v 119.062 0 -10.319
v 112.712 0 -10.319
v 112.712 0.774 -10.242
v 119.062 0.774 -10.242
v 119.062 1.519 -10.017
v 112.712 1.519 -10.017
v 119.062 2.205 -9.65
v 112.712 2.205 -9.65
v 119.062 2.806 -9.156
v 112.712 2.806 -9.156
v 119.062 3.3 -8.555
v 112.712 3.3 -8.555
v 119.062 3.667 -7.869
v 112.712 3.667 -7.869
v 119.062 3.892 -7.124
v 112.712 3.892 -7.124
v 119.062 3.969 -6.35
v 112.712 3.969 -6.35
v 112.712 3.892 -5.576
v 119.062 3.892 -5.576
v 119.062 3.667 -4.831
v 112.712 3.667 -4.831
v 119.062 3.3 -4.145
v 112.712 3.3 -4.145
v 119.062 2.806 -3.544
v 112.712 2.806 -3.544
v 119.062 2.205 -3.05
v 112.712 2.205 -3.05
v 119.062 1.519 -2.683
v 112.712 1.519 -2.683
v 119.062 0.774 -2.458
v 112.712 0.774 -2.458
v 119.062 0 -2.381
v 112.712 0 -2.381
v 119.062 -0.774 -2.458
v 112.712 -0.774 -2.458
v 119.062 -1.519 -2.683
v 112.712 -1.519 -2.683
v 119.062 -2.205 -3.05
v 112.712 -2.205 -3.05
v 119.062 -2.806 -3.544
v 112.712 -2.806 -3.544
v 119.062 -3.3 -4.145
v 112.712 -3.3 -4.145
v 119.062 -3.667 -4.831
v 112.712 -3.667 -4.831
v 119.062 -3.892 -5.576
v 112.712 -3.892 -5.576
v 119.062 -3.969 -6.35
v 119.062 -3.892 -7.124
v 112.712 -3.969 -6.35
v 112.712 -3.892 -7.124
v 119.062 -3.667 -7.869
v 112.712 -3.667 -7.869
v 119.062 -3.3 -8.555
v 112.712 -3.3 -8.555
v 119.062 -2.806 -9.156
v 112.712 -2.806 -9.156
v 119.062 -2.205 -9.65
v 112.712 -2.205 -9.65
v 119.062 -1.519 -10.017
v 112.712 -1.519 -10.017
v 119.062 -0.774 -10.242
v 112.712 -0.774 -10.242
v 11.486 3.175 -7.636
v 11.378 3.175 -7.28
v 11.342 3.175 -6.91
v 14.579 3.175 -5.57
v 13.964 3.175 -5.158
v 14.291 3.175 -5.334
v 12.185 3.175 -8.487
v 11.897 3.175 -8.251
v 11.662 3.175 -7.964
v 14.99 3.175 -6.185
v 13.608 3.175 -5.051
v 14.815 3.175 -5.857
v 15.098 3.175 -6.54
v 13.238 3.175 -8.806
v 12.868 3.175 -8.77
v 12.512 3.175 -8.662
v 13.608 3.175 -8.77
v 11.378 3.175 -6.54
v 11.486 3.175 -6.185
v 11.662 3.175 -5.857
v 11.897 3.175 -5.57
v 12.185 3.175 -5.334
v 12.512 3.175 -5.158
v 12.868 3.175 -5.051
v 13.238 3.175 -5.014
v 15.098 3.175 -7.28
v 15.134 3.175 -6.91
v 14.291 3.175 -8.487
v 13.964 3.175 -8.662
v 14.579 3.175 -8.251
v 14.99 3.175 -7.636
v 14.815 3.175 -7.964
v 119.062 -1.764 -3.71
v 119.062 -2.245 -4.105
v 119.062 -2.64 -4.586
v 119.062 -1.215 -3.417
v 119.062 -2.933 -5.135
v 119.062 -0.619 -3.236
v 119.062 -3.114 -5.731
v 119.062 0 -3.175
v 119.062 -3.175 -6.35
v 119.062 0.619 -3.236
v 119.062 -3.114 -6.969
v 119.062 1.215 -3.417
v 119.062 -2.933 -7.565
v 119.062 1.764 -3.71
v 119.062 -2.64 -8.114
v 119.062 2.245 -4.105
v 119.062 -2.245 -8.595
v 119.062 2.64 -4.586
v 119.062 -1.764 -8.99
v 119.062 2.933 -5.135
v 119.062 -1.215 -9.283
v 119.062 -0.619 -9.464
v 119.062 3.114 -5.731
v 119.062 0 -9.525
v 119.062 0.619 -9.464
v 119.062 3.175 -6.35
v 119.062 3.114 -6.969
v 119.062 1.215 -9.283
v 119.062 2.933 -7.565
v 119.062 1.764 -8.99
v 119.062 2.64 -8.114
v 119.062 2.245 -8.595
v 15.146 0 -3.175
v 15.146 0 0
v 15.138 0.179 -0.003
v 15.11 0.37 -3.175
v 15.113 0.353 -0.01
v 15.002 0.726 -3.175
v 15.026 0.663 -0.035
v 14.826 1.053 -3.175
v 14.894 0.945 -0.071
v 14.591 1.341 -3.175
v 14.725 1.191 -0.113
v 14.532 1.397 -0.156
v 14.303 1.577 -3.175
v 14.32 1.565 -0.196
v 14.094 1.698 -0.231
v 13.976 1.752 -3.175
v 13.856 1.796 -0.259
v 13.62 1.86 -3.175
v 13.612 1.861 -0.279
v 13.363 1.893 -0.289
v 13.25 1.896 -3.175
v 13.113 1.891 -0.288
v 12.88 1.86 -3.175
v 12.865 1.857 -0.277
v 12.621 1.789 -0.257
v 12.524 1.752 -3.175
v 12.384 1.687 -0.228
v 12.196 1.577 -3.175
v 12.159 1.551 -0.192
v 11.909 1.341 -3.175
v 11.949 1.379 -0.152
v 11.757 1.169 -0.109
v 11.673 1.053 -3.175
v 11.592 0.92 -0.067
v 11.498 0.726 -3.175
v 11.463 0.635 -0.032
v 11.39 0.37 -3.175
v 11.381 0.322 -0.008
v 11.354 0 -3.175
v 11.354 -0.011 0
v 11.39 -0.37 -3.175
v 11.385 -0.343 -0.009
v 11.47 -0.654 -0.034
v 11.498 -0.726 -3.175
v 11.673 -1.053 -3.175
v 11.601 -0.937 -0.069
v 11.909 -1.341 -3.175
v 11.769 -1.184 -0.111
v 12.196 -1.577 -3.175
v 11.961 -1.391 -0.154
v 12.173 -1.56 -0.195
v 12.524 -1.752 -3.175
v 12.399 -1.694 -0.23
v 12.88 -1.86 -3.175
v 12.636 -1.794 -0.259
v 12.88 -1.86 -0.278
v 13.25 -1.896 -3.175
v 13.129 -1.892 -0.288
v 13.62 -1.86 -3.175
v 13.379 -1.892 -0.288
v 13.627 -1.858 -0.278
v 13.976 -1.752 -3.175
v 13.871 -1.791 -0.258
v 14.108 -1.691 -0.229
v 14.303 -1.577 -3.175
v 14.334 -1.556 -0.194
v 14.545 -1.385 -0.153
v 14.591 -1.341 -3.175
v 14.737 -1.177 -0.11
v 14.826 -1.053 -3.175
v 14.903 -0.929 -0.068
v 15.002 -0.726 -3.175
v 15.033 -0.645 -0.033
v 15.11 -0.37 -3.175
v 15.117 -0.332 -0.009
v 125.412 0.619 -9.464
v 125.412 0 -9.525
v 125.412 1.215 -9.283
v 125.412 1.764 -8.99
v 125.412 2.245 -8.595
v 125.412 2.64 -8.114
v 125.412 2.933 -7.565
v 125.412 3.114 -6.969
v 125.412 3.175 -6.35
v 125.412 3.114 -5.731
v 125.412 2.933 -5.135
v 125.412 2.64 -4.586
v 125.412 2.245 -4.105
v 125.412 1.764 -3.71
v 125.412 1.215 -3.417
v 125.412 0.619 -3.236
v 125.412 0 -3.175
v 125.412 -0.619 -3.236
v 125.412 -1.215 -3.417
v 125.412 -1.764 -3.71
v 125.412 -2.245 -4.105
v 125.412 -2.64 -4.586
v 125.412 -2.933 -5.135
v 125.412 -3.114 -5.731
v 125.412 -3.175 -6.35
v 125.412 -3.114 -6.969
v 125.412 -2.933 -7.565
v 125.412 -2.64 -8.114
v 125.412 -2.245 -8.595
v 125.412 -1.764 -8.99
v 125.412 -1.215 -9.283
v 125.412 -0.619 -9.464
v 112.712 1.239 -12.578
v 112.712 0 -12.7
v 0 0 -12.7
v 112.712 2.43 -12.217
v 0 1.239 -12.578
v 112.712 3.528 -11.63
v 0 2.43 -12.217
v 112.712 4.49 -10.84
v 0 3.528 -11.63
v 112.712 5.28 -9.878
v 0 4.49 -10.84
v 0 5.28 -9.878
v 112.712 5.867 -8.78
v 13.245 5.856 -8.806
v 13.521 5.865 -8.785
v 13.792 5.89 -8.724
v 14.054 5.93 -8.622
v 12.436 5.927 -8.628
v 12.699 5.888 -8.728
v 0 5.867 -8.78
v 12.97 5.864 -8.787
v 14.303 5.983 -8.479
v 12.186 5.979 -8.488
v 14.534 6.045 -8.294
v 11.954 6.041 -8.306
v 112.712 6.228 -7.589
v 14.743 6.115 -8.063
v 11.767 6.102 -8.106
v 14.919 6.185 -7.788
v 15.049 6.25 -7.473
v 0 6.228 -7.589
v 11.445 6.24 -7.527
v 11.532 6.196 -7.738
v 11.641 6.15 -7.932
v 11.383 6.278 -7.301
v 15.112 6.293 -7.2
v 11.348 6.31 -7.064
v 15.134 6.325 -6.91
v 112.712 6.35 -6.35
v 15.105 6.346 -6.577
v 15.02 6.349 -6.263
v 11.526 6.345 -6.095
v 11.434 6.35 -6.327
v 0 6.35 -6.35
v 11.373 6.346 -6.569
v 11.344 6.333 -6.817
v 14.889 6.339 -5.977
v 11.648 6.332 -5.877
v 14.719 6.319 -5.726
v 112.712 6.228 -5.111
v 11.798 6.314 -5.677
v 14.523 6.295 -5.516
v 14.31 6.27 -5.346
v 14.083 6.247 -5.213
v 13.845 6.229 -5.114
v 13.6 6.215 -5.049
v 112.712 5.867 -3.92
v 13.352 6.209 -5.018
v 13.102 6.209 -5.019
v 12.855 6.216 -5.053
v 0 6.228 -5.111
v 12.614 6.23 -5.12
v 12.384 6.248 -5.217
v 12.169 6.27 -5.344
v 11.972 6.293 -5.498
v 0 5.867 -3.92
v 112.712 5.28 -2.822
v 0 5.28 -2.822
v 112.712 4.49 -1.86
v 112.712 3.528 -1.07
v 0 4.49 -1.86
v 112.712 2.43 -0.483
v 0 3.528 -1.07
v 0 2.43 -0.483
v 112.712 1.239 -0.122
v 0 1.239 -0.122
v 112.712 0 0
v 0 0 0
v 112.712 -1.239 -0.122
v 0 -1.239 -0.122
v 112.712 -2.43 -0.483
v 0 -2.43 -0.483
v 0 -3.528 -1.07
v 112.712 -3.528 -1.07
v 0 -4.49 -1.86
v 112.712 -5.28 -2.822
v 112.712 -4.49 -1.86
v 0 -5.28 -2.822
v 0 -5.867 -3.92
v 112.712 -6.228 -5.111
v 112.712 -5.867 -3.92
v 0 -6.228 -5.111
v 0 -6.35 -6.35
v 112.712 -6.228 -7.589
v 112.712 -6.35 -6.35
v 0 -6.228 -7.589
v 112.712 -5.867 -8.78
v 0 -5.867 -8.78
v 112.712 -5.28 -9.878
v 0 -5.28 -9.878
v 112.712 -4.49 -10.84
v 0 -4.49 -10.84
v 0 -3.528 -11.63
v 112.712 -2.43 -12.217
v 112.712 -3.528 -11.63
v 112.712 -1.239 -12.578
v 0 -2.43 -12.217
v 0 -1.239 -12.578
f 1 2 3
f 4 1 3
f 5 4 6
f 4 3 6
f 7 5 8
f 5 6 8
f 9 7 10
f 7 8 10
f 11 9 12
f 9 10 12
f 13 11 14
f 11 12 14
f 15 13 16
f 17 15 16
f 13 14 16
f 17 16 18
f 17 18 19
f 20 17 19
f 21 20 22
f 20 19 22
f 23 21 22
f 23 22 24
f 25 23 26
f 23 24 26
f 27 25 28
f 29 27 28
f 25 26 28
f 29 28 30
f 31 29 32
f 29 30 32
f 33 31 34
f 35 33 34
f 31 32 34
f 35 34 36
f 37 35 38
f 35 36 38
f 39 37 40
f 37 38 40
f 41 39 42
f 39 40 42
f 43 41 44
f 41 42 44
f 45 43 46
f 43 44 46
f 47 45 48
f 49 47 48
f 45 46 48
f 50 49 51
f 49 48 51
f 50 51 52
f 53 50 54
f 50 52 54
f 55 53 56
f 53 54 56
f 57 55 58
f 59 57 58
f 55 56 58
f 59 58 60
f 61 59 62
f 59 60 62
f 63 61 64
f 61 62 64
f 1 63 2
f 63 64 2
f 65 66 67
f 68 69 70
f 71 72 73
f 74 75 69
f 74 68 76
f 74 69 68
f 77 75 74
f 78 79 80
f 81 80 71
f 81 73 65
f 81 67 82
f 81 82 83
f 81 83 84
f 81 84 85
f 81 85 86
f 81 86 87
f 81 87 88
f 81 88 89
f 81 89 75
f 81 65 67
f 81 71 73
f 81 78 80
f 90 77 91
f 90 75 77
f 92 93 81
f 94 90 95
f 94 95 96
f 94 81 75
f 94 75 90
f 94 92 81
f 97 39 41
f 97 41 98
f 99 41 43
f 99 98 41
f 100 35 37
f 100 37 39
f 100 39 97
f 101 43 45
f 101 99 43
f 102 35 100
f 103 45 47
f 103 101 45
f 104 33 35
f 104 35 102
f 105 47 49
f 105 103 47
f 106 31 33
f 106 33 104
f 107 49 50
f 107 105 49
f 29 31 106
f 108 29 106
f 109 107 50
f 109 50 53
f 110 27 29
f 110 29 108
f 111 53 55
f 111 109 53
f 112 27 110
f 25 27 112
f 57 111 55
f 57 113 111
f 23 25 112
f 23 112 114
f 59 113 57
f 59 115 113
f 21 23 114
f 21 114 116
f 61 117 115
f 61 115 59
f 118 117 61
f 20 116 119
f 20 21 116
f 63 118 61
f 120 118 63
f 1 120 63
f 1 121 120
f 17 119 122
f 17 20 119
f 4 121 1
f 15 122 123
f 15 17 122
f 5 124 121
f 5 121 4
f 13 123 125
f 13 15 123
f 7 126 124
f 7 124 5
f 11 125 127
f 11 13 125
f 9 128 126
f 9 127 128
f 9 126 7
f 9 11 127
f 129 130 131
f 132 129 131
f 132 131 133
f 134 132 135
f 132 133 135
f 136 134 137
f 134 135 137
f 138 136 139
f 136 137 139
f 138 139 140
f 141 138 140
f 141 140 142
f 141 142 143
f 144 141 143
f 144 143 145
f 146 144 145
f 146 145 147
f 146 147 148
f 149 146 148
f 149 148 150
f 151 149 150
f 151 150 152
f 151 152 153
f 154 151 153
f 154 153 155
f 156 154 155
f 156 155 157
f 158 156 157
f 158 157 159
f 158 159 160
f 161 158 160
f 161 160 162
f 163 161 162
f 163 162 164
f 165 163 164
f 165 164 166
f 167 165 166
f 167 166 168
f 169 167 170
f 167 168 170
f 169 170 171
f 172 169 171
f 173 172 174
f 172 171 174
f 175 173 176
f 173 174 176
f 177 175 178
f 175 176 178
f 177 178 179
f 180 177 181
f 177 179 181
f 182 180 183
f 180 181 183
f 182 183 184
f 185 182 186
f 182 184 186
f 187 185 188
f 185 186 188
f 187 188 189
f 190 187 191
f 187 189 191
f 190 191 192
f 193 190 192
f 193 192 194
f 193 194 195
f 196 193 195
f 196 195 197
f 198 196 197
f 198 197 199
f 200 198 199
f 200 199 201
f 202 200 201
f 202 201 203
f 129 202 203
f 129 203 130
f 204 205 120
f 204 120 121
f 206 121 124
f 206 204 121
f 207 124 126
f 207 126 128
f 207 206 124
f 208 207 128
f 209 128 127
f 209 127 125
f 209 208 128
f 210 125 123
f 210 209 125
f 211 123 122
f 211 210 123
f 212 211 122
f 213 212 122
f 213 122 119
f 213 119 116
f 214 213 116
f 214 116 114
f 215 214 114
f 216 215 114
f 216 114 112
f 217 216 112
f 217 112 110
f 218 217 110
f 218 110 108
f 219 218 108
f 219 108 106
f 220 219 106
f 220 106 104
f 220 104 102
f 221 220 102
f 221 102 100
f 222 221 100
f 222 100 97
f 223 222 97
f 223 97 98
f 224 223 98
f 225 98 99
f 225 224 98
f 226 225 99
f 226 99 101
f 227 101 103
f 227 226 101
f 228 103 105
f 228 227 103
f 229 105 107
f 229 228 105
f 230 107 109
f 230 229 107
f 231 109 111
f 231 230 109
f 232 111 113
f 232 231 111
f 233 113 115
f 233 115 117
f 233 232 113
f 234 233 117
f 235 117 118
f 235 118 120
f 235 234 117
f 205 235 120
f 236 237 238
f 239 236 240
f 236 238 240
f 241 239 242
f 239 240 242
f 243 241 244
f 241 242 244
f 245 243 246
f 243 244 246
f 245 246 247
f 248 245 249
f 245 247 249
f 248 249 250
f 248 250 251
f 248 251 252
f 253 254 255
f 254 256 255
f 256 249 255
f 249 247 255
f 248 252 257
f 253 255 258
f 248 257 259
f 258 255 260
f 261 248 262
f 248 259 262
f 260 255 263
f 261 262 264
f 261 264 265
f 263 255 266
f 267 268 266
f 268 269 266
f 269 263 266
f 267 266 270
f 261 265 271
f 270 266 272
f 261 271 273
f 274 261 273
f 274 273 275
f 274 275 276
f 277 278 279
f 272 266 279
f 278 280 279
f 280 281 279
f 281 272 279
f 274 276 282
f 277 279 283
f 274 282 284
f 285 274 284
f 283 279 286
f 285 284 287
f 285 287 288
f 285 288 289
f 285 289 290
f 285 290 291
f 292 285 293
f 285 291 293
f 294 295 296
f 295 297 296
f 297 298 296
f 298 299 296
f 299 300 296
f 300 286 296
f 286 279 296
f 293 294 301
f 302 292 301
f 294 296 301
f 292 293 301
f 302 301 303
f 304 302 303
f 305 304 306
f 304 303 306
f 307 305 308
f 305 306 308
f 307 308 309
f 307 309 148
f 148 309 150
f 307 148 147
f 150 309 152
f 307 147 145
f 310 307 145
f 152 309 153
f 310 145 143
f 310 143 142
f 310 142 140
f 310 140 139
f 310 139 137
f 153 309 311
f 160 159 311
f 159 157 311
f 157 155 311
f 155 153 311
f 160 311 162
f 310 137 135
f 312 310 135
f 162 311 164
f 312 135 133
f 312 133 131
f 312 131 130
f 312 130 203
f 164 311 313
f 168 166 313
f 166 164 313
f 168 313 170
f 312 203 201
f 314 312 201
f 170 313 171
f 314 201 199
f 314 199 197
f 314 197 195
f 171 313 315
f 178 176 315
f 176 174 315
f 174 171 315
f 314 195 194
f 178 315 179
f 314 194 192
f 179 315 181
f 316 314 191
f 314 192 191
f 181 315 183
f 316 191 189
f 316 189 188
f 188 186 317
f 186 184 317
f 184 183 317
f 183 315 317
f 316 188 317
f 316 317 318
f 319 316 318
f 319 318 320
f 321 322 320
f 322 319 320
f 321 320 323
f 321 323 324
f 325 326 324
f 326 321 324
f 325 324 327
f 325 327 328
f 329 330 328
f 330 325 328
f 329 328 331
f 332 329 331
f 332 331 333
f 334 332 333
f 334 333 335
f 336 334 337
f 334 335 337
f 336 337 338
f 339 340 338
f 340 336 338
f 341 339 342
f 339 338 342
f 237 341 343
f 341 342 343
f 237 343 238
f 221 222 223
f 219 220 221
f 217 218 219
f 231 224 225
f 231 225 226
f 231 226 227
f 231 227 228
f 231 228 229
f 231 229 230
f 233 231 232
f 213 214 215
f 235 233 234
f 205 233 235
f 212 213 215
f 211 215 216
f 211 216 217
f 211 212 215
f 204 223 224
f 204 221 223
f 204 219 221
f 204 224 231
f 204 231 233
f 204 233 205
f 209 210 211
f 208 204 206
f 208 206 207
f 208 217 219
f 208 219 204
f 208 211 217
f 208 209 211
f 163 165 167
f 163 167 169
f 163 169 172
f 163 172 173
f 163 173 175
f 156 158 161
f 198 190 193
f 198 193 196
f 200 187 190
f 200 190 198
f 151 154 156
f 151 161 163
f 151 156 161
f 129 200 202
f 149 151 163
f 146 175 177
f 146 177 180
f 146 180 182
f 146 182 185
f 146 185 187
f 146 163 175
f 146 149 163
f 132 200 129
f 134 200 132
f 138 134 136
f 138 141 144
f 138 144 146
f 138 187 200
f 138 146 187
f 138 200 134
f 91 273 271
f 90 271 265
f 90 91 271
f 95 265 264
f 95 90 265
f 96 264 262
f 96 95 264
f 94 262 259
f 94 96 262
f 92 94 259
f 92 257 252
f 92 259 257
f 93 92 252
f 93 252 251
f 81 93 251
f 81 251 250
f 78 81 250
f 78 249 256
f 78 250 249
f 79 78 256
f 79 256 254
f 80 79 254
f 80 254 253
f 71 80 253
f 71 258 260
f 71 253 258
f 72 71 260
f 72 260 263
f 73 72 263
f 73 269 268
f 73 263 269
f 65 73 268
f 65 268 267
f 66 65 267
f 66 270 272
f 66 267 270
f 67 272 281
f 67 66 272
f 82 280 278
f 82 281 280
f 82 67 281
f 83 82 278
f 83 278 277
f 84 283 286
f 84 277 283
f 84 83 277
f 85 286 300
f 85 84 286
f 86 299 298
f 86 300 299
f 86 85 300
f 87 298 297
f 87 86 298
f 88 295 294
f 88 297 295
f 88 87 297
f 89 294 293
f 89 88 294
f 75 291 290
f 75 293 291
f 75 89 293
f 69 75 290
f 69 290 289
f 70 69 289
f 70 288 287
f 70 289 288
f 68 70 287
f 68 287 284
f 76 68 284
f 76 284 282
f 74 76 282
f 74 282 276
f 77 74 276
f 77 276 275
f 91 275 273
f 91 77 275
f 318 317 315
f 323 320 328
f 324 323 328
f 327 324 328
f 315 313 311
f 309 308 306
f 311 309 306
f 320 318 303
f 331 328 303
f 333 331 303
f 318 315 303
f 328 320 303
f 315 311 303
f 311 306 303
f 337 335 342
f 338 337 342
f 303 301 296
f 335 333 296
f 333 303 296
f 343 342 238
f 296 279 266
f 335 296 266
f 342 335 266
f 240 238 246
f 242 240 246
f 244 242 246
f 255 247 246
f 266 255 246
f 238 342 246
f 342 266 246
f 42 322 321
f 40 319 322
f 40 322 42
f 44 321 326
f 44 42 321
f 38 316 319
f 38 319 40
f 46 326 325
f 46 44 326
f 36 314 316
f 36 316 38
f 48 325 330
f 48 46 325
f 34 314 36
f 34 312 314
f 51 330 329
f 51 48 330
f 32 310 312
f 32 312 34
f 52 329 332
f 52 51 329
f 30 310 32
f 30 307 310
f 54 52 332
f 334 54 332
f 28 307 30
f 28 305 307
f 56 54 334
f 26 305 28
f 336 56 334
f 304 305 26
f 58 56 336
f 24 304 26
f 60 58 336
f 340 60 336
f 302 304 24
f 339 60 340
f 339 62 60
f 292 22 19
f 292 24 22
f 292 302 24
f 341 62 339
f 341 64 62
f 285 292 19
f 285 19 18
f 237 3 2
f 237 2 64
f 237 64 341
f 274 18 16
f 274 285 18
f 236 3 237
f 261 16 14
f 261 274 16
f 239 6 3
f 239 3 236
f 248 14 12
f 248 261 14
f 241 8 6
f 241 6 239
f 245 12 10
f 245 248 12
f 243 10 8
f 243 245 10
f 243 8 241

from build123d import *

# Parameters (mm, degrees)
SKETCH1_R              = 6.35
BOSS_EXTRUDE1_DEPTH    = 125.4125
SKETCH2_R              = 1.89611
CUT_EXTRUDE1_DEPTH     = 3.175
CUT_EXTRUDE2_START     = 3.175
CUT_EXTRUDE2_OUTLINE_R = 1.89611
CUT_EXTRUDE2_DEPTH     = 3.1750001
SKETCH3_OUTSIDE_W      = 40.038
SKETCH3_OUTSIDE_H      = 40.038
SKETCH3_OUTSIDE_R      = 3.175
CUT_EXTRUDE3_DEPTH     = 12.7
SKETCH4_R              = 3.96875
BOSS_EXTRUDE2_DEPTH    = 6.35


# Read off the part's stored shape, not the designer's step: Cut-Extrude2
with BuildPart() as part:
    # Sketch1 → Boss-Extrude1 (new body)
    with BuildSketch(Plane(origin=(0, 0, 0), x_dir=(0, 0, -1), z_dir=(1, 0, 0))):
        with Locations((6.35, 0)):
            Circle(SKETCH1_R)
    extrude(amount=BOSS_EXTRUDE1_DEPTH)

    # Sketch2 → Cut-Extrude1 (cut)
    with BuildSketch(Plane.XY):
        with Locations((13.24991, 0)):
            Circle(SKETCH2_R)
    extrude(amount=-CUT_EXTRUDE1_DEPTH, mode=Mode.SUBTRACT)

    # Cut-Extrude2 outline → Cut-Extrude2 (cut)
    with BuildSketch(Plane(origin=(0, 0, 0), x_dir=(1, 0, 0), z_dir=(0, 1, 0)).offset(CUT_EXTRUDE2_START)):
        with Locations((13.23805984, 6.910255895)):
            Circle(CUT_EXTRUDE2_OUTLINE_R)
    extrude(amount=CUT_EXTRUDE2_DEPTH, mode=Mode.SUBTRACT)

    # Sketch3 outside → Cut-Extrude3 (cut)
    with BuildSketch(Plane(origin=(125.4125, 0, 0), x_dir=(0, 0, -1), z_dir=(1, 0, 0))):
        with Locations((6.35, 0)):
            Rectangle(SKETCH3_OUTSIDE_W, SKETCH3_OUTSIDE_H)
        with Locations((6.35, 0)):
            Circle(SKETCH3_OUTSIDE_R, mode=Mode.SUBTRACT)
    extrude(amount=-CUT_EXTRUDE3_DEPTH, mode=Mode.SUBTRACT)

    # Sketch4 → Boss-Extrude2 (add)
    with BuildSketch(Plane(origin=(112.7125, 0, 0), x_dir=(0, 0, -1), z_dir=(1, 0, 0))):
        with Locations((6.35, 0)):
            Circle(SKETCH4_R)
    extrude(amount=BOSS_EXTRUDE2_DEPTH)


solid = part.part
